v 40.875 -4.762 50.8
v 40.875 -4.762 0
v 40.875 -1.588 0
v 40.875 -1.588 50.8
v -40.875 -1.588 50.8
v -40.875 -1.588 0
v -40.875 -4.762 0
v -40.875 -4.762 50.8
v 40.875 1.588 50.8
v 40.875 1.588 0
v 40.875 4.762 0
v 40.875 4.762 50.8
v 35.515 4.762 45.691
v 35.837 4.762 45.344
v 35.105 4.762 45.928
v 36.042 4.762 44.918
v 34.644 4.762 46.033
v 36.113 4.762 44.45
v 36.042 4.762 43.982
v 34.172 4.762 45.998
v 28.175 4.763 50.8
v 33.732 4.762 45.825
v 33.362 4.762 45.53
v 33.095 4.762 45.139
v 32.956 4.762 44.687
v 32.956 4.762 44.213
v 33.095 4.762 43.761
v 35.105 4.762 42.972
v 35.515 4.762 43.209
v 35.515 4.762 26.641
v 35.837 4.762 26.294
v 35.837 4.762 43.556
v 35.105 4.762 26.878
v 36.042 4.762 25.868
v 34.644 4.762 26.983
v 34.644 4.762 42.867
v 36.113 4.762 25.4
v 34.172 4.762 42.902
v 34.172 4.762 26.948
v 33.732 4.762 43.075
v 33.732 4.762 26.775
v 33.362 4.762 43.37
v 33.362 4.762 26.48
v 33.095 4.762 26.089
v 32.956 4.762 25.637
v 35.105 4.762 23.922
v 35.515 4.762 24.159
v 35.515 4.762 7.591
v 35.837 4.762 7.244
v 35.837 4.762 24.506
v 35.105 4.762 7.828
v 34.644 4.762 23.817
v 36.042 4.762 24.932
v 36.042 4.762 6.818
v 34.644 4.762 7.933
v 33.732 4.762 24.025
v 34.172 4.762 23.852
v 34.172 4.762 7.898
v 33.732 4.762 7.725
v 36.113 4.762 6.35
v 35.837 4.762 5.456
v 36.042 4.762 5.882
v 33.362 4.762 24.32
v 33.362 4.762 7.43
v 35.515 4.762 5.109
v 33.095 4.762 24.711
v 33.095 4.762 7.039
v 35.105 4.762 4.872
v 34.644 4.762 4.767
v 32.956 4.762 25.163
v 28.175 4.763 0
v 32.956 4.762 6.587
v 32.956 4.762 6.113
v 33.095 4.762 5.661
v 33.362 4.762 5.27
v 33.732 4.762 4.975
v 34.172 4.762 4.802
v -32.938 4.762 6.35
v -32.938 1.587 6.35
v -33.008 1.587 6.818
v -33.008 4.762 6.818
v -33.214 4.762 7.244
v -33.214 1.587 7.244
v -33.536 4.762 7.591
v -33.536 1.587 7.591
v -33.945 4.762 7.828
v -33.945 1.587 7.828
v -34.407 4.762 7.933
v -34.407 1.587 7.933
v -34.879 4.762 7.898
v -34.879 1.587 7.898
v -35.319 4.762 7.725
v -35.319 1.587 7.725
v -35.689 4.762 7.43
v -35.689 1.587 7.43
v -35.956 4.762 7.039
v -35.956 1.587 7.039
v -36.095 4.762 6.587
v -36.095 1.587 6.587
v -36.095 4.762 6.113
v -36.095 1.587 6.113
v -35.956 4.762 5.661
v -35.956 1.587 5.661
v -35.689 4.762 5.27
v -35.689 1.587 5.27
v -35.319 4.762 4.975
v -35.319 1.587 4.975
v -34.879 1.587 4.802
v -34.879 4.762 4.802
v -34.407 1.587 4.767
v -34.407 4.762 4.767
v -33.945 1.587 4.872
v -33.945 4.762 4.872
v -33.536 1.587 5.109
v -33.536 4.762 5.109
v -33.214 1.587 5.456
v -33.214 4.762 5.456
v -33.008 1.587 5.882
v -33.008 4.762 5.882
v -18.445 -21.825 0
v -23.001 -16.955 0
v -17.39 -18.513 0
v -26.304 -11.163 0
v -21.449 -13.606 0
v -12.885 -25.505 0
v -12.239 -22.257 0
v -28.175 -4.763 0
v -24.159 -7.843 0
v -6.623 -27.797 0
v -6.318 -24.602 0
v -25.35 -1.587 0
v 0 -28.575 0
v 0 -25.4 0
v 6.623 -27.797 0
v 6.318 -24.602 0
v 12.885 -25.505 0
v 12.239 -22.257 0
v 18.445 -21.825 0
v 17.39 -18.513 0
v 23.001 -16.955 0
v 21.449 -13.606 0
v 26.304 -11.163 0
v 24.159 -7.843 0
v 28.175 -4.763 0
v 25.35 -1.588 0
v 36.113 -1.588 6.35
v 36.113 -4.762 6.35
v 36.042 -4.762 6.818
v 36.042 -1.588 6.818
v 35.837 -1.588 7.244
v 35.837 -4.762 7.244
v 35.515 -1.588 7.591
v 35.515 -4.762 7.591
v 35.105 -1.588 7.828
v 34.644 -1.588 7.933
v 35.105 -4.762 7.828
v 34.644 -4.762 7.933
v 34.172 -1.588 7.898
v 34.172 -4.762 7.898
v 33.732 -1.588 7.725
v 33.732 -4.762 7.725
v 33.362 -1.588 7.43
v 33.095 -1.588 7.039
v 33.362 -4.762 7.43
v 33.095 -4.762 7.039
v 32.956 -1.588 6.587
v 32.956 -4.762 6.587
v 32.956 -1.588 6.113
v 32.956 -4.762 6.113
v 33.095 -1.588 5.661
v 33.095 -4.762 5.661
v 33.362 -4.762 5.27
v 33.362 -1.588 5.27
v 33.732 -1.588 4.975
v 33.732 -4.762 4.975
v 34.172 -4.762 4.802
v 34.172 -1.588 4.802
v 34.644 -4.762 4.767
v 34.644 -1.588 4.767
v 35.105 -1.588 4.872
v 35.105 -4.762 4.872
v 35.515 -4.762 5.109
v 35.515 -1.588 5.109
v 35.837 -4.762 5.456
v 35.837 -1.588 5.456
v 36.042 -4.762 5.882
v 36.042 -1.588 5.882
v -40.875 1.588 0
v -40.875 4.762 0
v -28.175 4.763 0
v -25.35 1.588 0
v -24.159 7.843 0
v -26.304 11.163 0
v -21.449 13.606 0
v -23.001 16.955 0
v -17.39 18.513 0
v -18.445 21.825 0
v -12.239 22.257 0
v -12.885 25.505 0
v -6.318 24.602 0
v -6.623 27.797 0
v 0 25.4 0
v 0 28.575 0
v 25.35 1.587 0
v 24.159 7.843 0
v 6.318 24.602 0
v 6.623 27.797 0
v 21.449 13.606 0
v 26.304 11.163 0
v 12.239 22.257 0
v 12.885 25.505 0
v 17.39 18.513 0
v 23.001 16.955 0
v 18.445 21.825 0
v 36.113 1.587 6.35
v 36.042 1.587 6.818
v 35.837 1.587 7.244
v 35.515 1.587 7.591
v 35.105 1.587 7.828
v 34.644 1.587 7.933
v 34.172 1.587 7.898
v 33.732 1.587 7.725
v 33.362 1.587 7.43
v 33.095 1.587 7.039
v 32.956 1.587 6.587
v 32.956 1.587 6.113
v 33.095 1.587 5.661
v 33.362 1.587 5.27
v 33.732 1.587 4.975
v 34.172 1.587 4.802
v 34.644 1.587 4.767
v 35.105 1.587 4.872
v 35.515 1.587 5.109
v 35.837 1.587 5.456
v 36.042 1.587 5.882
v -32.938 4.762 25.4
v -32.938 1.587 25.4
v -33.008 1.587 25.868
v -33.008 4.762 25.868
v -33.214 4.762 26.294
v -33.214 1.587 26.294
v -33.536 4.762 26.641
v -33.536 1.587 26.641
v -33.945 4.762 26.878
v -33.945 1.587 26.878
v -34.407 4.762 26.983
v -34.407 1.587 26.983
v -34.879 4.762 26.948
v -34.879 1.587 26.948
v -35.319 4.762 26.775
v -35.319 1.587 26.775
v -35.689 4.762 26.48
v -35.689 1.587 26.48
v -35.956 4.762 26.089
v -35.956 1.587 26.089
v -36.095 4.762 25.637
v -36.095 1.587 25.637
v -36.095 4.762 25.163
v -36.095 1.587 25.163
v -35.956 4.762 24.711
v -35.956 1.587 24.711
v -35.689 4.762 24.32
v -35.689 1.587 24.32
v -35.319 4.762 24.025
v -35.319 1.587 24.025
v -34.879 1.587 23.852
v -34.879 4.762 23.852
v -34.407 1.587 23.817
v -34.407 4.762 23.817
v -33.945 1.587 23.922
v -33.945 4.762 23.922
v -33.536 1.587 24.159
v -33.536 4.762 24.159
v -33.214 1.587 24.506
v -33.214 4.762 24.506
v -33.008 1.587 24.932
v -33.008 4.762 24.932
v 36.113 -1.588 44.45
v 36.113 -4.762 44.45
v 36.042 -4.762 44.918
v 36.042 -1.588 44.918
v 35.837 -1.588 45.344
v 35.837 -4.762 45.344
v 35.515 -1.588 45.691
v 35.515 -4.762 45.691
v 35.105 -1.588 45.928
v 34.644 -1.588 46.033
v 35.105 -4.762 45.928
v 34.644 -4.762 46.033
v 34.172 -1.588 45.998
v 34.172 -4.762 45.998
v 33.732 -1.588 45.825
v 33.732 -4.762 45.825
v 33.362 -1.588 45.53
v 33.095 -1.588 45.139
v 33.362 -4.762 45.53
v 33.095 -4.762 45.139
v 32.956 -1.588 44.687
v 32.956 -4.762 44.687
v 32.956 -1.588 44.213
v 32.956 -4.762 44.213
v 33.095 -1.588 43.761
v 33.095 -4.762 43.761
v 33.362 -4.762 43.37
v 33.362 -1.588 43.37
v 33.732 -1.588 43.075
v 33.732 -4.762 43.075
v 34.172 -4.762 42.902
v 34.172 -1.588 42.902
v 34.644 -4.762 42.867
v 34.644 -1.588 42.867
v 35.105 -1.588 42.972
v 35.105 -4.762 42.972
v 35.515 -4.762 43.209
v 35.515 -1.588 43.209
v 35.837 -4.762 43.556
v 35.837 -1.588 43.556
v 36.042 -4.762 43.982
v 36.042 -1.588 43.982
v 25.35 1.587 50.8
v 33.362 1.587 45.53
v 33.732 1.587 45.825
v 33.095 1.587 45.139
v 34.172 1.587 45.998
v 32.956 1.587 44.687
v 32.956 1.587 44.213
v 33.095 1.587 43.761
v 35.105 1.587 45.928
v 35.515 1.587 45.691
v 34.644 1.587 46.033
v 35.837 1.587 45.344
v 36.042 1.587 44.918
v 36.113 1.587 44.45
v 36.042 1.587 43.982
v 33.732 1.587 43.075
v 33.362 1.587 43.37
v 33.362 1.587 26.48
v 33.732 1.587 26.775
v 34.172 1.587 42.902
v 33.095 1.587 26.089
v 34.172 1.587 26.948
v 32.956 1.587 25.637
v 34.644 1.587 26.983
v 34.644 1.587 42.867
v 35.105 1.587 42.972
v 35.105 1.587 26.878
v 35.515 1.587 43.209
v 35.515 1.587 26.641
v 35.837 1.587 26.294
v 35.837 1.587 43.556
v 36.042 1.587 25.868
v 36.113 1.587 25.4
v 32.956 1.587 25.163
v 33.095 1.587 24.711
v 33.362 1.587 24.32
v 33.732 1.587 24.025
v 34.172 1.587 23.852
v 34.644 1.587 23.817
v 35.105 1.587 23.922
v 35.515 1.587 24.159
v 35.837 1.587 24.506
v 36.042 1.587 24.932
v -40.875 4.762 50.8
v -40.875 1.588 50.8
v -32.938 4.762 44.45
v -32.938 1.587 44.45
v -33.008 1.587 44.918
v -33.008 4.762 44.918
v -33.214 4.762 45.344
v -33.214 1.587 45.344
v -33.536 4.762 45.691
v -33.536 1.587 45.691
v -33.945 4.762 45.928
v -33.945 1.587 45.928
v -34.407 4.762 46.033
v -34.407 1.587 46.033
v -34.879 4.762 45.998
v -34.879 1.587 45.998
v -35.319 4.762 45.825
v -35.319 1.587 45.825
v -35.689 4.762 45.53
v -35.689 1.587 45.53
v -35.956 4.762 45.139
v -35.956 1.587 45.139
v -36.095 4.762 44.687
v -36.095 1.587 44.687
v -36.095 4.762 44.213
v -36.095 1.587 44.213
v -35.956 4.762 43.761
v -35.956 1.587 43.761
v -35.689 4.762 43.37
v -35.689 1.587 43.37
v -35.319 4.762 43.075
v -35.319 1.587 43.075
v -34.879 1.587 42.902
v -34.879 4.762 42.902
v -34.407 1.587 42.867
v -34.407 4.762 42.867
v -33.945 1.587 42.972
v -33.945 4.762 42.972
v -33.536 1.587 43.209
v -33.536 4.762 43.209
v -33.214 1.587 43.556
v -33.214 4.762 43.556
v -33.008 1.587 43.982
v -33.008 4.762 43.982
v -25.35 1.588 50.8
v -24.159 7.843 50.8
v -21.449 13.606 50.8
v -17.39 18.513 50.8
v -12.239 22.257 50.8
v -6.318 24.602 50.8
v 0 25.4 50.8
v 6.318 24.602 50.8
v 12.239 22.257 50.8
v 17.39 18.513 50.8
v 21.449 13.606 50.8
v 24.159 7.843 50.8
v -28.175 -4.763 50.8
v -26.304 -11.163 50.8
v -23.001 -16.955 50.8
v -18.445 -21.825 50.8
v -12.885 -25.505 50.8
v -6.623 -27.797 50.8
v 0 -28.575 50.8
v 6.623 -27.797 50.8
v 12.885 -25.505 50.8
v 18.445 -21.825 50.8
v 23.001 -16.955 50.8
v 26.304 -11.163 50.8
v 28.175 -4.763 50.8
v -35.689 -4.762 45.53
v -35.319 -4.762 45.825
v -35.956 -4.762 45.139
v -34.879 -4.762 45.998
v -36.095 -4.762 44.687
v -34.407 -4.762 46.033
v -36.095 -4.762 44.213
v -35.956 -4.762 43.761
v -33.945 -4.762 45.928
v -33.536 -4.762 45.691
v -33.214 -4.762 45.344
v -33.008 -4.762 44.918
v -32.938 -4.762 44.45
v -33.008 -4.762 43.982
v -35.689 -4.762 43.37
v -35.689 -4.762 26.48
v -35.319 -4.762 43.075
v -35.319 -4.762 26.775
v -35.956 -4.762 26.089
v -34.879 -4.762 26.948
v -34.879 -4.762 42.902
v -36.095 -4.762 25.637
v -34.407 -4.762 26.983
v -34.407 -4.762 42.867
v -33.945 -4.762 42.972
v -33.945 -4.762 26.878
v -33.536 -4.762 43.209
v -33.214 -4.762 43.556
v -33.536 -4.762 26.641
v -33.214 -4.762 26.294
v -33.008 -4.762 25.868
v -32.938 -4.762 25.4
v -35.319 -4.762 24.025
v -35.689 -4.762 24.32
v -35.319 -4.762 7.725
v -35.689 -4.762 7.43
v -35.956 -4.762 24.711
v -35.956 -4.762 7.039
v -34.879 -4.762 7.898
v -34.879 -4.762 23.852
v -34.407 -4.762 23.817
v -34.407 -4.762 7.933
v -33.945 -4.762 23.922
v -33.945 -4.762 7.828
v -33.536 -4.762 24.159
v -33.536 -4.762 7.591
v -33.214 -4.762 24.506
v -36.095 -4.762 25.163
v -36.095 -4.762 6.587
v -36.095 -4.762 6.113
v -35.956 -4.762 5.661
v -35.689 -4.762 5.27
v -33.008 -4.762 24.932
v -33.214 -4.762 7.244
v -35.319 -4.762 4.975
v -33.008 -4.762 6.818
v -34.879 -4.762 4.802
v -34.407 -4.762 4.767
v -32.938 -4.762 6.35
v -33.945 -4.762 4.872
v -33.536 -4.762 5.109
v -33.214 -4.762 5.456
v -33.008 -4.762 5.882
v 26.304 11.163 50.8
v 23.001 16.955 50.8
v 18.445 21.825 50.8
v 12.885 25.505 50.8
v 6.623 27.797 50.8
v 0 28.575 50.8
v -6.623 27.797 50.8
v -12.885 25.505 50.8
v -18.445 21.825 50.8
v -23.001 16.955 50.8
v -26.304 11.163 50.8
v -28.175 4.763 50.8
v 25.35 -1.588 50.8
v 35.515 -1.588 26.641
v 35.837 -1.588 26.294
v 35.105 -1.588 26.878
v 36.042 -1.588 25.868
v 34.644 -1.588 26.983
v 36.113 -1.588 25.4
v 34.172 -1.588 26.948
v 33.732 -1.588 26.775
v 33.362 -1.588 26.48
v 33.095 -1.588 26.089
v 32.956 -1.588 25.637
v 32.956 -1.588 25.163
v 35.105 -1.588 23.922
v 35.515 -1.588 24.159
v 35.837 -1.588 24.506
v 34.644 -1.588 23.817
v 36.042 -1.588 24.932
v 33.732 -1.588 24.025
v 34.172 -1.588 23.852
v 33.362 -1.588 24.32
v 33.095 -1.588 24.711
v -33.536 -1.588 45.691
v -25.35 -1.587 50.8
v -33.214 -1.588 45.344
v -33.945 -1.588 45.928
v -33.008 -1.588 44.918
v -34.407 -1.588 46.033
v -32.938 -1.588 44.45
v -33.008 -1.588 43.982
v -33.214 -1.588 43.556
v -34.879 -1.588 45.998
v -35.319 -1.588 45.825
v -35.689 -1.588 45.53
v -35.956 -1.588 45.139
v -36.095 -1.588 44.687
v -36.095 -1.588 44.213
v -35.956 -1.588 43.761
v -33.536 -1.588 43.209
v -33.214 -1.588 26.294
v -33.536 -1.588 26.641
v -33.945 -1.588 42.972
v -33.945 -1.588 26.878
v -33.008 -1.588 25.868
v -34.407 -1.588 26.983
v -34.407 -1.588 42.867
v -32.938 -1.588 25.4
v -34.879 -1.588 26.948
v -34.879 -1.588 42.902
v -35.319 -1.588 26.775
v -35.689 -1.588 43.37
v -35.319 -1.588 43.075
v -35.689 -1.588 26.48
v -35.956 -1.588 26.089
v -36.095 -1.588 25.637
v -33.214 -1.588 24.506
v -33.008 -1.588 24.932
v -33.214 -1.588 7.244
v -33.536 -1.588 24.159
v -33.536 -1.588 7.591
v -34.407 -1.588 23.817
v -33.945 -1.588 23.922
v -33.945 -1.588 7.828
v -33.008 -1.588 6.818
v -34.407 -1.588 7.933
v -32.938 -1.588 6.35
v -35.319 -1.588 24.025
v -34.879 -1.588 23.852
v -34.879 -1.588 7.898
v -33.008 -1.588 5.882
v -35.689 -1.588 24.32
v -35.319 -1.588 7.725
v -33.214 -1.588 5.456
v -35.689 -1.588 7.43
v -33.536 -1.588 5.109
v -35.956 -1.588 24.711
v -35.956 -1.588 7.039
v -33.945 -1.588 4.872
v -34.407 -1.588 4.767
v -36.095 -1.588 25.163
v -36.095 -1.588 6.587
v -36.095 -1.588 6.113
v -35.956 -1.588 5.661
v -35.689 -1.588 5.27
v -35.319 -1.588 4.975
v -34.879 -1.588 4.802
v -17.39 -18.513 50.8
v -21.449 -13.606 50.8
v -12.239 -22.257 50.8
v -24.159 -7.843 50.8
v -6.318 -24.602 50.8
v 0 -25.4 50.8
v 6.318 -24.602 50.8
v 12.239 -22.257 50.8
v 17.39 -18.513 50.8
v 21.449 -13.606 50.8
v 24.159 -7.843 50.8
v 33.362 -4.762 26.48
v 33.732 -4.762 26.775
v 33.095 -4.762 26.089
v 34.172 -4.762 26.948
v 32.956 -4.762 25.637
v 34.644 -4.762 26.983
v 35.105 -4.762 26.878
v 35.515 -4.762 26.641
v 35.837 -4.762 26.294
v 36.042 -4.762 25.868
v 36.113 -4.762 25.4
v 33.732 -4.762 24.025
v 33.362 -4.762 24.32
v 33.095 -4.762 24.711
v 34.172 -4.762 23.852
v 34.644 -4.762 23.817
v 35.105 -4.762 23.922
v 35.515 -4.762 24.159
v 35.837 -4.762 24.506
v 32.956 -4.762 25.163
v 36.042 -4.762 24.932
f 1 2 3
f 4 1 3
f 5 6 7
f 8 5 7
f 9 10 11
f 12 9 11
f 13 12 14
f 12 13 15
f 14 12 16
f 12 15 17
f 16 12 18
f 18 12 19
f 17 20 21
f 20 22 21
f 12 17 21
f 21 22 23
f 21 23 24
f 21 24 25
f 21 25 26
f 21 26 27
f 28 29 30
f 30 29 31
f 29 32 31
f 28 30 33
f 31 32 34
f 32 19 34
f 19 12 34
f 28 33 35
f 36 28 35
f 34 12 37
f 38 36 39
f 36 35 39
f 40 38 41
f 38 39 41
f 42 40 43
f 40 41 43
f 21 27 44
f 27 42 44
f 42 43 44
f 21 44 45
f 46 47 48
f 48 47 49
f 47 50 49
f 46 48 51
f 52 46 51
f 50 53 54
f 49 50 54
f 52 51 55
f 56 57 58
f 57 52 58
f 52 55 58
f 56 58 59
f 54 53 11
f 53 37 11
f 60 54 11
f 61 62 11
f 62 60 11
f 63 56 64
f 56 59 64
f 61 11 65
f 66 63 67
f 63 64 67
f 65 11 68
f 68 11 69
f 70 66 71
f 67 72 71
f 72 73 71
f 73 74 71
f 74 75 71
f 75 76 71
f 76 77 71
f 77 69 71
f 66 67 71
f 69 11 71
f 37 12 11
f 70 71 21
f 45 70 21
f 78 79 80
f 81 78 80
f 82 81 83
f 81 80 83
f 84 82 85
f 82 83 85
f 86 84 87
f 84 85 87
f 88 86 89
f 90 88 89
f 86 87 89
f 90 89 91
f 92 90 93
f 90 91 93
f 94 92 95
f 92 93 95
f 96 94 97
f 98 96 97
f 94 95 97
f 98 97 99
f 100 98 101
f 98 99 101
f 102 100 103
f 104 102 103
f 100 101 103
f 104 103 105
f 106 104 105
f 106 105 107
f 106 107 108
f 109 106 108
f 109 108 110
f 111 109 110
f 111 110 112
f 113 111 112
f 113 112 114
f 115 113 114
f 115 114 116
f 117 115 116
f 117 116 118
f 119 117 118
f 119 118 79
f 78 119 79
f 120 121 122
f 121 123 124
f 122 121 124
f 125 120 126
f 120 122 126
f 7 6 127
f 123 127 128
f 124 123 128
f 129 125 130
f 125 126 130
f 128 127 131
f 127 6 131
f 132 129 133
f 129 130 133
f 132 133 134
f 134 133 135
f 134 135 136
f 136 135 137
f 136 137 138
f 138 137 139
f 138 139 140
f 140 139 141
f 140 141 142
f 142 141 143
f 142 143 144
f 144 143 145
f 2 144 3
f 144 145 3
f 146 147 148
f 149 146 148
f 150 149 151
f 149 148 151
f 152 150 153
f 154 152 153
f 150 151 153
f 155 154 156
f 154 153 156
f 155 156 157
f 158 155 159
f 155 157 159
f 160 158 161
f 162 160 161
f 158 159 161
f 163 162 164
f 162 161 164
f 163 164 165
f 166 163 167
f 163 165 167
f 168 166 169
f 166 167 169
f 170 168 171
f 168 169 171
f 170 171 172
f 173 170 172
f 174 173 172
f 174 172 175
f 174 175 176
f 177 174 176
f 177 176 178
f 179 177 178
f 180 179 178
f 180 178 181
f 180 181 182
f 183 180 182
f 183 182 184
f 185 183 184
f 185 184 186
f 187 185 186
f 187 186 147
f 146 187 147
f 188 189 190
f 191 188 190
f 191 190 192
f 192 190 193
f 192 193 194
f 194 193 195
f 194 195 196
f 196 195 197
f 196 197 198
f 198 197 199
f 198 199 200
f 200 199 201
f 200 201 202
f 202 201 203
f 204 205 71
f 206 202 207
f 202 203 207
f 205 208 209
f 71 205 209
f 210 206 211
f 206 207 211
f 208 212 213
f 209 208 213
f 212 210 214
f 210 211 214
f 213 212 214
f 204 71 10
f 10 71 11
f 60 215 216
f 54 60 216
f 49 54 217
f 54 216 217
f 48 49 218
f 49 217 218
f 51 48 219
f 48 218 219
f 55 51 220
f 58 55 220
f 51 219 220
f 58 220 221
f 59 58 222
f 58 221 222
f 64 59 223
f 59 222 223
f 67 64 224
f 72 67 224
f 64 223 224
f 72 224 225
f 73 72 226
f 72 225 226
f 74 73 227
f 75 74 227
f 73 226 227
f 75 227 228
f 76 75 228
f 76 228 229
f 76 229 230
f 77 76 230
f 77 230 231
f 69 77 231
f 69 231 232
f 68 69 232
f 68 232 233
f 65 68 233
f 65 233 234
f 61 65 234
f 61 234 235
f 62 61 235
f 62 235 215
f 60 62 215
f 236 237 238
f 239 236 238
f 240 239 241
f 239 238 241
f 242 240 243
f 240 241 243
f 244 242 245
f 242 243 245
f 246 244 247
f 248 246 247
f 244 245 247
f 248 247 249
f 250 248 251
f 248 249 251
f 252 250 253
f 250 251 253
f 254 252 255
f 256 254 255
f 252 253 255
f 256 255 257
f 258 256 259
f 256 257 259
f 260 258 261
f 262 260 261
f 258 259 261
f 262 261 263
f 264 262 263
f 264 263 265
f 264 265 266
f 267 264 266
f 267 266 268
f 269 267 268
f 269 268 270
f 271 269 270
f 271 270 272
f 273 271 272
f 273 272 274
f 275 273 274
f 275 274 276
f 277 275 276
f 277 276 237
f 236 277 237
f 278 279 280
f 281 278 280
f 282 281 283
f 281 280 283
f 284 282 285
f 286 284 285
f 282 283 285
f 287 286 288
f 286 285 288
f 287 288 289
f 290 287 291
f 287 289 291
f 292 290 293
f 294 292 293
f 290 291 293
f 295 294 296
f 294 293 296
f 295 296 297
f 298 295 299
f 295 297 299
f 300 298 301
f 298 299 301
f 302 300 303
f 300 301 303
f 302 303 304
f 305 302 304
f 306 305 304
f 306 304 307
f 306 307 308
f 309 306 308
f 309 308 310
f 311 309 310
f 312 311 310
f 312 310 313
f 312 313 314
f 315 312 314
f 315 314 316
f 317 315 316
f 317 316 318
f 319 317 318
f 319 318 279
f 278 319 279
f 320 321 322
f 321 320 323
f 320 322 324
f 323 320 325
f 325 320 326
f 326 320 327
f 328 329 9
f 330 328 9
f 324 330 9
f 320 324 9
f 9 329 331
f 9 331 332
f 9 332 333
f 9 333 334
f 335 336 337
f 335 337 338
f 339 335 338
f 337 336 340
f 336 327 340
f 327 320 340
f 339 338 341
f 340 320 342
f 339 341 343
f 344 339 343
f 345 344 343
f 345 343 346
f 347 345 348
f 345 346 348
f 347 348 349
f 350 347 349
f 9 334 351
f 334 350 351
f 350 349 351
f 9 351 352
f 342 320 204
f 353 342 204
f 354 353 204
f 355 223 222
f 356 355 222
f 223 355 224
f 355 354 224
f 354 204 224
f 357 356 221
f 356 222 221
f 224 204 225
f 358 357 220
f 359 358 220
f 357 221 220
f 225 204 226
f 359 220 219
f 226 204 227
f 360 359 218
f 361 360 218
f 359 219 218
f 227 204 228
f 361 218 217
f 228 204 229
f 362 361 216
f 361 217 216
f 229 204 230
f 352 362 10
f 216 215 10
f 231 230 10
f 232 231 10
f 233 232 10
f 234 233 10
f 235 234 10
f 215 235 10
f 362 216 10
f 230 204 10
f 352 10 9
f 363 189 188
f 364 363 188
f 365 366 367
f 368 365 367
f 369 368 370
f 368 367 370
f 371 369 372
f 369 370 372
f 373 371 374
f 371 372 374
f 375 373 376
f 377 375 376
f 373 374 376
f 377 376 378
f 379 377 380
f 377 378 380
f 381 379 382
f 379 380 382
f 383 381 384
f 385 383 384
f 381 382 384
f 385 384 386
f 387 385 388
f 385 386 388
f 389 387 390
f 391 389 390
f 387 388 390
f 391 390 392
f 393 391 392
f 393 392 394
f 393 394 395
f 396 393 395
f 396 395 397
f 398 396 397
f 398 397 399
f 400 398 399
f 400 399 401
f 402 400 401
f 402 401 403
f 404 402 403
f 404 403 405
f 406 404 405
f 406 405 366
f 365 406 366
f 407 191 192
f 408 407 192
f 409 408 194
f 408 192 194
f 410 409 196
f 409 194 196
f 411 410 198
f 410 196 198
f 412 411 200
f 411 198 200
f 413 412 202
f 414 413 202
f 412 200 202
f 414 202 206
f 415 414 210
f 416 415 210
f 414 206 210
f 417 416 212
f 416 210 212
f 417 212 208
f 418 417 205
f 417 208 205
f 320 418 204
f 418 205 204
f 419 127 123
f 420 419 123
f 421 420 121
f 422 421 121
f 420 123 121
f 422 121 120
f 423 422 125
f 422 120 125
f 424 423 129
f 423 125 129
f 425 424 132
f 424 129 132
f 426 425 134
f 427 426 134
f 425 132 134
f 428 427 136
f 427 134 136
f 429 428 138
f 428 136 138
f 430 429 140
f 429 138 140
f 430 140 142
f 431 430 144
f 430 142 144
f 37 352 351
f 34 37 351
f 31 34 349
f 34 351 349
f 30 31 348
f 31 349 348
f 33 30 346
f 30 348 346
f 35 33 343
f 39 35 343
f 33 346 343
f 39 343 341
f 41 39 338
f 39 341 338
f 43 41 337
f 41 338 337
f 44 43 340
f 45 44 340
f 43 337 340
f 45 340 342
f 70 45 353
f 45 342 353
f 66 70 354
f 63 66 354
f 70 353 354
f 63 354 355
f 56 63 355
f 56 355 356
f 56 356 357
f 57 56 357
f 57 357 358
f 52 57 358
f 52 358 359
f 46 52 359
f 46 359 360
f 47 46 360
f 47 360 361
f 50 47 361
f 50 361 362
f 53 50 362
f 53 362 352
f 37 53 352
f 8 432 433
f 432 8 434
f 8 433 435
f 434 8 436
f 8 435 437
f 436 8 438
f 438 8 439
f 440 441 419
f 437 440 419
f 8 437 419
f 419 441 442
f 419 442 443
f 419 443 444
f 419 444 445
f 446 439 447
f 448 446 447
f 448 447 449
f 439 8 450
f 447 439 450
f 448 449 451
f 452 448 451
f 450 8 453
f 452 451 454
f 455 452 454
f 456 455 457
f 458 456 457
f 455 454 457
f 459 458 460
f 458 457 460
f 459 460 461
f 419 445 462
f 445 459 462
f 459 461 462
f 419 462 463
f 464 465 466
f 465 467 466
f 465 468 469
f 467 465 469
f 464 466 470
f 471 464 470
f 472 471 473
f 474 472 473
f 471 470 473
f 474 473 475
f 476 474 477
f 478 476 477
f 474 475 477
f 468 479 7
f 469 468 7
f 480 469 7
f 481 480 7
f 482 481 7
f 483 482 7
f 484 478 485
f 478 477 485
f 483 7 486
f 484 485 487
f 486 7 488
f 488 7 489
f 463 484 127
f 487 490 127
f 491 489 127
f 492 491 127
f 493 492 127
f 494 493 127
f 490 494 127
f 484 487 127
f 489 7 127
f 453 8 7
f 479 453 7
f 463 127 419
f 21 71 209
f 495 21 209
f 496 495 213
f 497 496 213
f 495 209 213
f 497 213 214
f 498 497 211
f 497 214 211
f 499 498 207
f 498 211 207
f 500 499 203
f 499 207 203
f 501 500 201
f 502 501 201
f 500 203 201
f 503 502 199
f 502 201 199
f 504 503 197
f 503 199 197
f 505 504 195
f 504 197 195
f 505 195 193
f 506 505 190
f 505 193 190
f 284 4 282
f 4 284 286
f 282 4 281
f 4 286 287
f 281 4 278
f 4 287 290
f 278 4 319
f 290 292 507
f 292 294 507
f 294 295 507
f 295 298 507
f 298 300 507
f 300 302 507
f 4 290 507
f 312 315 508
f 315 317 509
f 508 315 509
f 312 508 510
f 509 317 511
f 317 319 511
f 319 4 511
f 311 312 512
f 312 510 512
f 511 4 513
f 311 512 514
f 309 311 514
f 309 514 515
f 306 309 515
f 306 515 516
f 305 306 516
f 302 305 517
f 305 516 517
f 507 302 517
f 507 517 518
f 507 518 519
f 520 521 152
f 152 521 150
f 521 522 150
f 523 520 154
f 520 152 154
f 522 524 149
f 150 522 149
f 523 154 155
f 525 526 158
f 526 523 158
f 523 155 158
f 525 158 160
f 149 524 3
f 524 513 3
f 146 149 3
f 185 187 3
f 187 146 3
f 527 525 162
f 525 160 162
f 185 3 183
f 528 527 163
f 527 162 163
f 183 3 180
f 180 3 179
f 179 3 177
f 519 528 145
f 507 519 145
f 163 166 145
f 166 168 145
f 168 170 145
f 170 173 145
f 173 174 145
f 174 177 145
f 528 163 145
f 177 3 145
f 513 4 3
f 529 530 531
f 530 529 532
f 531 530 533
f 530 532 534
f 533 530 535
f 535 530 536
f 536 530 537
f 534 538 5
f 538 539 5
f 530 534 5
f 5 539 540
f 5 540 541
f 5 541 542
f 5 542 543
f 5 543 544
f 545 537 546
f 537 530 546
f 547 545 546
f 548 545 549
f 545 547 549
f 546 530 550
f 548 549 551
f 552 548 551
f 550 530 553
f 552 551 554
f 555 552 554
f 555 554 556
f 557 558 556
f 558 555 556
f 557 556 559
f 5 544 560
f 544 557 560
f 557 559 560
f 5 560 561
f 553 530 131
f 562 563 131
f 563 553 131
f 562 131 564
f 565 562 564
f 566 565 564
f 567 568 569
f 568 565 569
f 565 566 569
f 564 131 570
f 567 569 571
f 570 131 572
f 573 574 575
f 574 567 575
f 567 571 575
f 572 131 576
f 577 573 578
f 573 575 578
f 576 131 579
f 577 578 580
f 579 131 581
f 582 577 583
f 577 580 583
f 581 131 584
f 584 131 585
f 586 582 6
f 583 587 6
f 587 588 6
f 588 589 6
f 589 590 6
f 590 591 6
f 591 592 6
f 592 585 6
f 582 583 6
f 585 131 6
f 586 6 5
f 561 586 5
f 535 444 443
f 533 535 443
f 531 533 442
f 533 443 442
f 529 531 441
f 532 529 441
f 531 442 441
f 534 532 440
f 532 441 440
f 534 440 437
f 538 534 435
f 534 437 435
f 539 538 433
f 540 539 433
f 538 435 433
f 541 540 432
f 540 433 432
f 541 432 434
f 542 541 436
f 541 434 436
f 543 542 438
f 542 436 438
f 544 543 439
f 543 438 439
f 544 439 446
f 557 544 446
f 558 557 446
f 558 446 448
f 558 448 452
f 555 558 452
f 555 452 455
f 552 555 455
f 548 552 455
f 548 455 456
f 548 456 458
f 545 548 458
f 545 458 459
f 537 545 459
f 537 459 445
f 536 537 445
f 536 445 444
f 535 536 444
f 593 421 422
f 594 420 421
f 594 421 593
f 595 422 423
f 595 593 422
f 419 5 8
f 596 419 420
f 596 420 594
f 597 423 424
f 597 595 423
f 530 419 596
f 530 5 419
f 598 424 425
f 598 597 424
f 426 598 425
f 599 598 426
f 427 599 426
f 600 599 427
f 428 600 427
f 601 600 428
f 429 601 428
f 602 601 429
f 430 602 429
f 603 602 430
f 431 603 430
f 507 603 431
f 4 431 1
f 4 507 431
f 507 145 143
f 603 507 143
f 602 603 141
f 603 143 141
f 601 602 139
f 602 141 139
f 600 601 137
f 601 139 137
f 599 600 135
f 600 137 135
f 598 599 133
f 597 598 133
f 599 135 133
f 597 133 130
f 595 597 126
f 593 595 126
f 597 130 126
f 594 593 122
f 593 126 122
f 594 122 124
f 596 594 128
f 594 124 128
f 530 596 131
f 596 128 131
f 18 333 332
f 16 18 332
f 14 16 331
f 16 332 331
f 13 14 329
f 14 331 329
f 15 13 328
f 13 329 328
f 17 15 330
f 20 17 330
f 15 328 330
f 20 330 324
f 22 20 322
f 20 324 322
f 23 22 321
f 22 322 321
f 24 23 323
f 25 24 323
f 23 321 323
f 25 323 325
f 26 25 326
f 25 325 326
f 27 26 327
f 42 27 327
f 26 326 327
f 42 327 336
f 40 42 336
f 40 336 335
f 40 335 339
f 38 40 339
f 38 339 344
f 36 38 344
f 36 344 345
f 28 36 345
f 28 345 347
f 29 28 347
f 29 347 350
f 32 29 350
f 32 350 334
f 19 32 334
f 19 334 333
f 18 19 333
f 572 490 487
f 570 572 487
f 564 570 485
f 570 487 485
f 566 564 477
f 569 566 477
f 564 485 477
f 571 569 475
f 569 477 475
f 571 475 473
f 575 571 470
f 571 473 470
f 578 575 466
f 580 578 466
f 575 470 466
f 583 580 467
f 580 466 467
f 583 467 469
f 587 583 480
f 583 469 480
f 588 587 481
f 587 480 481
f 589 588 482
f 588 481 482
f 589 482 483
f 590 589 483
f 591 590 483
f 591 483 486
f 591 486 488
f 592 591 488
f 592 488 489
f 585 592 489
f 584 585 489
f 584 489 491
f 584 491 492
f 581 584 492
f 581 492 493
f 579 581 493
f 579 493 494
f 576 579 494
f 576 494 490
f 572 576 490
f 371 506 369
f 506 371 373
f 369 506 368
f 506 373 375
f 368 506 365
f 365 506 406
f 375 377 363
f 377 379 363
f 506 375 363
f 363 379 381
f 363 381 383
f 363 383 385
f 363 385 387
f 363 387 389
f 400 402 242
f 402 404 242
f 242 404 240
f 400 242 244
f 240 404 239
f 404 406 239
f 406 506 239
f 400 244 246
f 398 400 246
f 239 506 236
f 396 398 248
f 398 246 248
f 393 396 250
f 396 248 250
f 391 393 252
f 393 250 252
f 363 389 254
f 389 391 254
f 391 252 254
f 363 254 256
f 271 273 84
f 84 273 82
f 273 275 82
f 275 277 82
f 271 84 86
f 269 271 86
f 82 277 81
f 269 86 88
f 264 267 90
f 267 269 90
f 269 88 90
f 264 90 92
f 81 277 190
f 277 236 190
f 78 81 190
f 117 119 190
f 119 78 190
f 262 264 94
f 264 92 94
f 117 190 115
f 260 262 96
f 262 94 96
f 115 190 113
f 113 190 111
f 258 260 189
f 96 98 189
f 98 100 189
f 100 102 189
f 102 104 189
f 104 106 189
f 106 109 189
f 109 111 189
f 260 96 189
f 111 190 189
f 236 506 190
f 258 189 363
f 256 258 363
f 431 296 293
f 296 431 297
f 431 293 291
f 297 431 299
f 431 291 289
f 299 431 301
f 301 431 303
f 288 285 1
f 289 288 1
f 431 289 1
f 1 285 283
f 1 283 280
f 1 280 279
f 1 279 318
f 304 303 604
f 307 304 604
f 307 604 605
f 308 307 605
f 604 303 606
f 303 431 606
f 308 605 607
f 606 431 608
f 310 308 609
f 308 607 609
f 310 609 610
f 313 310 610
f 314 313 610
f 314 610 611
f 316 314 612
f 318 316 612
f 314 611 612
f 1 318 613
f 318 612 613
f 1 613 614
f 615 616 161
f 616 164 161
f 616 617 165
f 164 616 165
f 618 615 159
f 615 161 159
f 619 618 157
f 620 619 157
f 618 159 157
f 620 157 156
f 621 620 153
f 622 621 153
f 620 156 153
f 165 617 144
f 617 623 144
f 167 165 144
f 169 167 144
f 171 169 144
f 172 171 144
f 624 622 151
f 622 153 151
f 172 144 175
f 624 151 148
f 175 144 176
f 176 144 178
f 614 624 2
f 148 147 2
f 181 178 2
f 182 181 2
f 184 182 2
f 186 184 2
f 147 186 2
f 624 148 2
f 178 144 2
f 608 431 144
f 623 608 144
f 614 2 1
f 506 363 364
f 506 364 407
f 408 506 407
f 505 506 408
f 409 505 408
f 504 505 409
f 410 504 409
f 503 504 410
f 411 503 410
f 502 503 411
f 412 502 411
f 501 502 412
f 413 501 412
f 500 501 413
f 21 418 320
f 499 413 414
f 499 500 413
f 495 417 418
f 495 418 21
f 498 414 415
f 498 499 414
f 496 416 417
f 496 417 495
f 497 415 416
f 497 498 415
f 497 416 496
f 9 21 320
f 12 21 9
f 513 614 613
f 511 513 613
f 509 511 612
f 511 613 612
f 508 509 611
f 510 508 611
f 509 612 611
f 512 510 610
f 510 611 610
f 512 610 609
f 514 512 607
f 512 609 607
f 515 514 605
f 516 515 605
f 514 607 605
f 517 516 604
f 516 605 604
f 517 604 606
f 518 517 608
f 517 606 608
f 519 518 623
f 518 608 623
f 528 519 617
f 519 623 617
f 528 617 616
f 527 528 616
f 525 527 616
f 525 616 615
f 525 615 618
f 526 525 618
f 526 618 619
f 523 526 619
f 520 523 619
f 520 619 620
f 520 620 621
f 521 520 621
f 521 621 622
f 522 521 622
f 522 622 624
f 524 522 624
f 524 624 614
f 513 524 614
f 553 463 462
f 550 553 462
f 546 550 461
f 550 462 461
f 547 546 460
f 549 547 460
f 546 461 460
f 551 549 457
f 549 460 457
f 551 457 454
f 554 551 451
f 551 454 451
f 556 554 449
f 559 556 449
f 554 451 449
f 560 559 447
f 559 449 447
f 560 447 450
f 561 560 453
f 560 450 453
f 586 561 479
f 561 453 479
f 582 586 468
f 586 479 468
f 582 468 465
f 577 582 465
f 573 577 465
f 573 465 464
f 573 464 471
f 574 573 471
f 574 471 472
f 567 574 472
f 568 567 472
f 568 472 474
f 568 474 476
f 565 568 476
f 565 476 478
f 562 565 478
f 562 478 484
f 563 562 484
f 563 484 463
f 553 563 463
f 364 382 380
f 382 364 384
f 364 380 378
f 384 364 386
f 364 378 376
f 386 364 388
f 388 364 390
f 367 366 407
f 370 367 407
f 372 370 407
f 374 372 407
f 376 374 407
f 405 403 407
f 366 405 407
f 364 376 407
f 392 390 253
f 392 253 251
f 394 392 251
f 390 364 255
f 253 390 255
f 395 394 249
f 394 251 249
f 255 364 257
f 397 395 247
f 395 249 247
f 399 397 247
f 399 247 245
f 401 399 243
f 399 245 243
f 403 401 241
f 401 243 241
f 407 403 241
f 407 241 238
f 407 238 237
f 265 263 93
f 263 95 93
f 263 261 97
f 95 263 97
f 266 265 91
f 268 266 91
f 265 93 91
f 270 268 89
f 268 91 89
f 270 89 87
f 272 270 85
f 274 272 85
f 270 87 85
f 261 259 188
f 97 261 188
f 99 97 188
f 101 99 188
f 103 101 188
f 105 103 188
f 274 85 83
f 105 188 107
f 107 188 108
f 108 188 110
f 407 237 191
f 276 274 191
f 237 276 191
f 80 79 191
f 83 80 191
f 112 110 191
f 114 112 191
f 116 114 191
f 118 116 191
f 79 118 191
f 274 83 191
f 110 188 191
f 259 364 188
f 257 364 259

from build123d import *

# Parameters (mm, degrees)
F1_DEPTH = 50.8
F2_R     = 1.5875
F3_DEPTH = 33.3385


with BuildPart() as f1:
    # F0 (on Top) → F1 (new body)
    with BuildSketch(Plane.XY):
        with BuildLine():
            ThreePointArc((25.350342, -1.5875), (0, -25.4), (-25.350342, -1.5875))
            Line((-25.350342, -1.5875), (-40.87533, -1.5875))
            Line((-40.87533, -1.5875), (-40.87533, -4.7625))
            Line((-40.87533, -4.7625), (-28.17533, -4.7625))
            ThreePointArc((-28.17533, -4.7625), (0, -28.575), (28.17533, -4.7625))
            Line((28.17533, -4.7625), (40.87533, -4.7625))
            Line((40.87533, -4.7625), (40.87533, -1.5875))
            Line((40.87533, -1.5875), (25.350342, -1.5875))
        make_face()
        with BuildLine():
            Line((-40.87533, 4.7625), (-40.87533, 1.5875))
            Line((-40.87533, 1.5875), (-25.350342, 1.5875))
            ThreePointArc((-25.350342, 1.5875), (0, 25.4), (25.350342, 1.5875))
            Line((25.350342, 1.5875), (40.87533, 1.5875))
            Line((40.87533, 1.5875), (40.87533, 4.7625))
            Line((40.87533, 4.7625), (28.17533, 4.7625))
            ThreePointArc((28.17533, 4.7625), (0, 28.575), (-28.17533, 4.7625))
            Line((-28.17533, 4.7625), (-40.87533, 4.7625))
        make_face()
    extrude(amount=F1_DEPTH)

    # F2 (on face) → F3 (cut, through all)
    with BuildSketch(Plane.XZ.offset(4.7625)):
        with Locations((34.52533, 44.45)):
            Circle(F2_R)
        with Locations((34.52533, 25.4)):
            Circle(F2_R)
        with Locations((34.52533, 6.35)):
            Circle(F2_R)
        with Locations((-34.52533, 25.4)):
            Circle(F2_R)
        with Locations((-34.52533, 6.35)):
            Circle(F2_R)
        with Locations((-34.52533, 44.45)):
            Circle(F2_R)
    extrude(amount=-F3_DEPTH, mode=Mode.SUBTRACT)


solid = f1.part
